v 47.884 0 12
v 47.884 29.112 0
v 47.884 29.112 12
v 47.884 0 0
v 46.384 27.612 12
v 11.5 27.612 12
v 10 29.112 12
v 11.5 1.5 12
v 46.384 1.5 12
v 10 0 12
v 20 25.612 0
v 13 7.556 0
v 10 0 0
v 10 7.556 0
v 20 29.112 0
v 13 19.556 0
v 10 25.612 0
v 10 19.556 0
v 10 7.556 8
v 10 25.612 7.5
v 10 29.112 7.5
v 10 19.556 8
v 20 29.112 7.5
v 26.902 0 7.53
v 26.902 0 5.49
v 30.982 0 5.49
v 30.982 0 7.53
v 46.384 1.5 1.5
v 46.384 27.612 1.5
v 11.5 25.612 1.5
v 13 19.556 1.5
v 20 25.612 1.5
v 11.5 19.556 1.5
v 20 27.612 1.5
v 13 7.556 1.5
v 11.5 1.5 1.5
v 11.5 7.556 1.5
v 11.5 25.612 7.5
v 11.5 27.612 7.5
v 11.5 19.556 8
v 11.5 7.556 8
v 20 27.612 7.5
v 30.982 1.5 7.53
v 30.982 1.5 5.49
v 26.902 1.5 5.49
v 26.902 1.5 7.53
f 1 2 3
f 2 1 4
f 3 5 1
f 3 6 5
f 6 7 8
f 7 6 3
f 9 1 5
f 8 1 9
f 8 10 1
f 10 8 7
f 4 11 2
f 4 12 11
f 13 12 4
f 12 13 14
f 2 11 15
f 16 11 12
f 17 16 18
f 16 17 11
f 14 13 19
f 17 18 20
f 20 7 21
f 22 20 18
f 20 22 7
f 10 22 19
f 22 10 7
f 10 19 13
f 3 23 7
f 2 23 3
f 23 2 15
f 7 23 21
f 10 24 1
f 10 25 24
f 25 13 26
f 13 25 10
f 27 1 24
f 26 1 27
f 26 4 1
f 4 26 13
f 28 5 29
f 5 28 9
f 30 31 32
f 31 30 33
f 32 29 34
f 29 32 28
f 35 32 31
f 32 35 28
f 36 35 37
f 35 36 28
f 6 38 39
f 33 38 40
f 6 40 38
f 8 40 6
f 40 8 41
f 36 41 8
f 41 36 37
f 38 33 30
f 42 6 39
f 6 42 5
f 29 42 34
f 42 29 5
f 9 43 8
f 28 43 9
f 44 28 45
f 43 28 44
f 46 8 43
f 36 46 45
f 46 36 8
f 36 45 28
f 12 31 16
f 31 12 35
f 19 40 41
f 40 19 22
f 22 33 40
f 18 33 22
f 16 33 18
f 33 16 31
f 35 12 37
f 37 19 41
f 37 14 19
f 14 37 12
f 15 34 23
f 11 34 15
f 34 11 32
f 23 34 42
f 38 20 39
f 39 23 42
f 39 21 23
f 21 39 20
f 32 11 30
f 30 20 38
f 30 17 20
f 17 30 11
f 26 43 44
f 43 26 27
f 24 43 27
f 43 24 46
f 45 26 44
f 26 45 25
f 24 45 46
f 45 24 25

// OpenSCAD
length = 34.2 * 1.02;
width = 25.6 * 1.02;

height = 12.0;

thickness = 1.5;
fudge = 0.8;

cylinder_fn = 18;

cable = true;
hole = true;

// case
translate([10, 0, 0])
difference()
{
    //
    translate([0, 0, 0])
        cube([length + 2*thickness, width + 2*thickness, height]);
    translate([thickness, thickness, thickness])
        cube([length, width, height]);
    
    // usb connector
    translate([0, width/2 + thickness - 7, 0])
        cube([3, 12 ,8]);
    
    // reset button
    translate([0, thickness + width - 2, 0])
        cube([10, 2 + thickness, 6 + thickness]);
    
    // cable hole
    if (cable) {
        translate([(length - 4 * 1.02) / 2 + thickness, 0, (height - 1 * 1.02) / 2])
            cube([4 * 1.02, thickness, 2 * 1.02]);
    }
}


// top
//translate([-10 - length - 2*thickness, 0, 0])
//difference()
//{
//    union()
//    {
//        translate([0, 0, 0])
//            cube([length + 2*thickness, width + 2*thickness, thickness]);
//        translate([thickness, thickness, 0])
//            cube([length, width, thickness + fudge]);
//    
//        // hole
//        if (hole) {
//            translate([5, width / 2 + thickness - 4.35, 0])
//                cylinder(h = 3 + thickness + fudge, r = 1.5, $fn = cylinder_fn);
//            translate([5, width / 2 + thickness + 4.35, 0])
//                cylinder(h = 3 + thickness + fudge, r = 1.5, $fn = cylinder_fn);
//        }
//    }
//    
//    if (hole) {
//        translate([10, width / 2 + thickness, 0])
//            cylinder(h = thickness + fudge, r2 = 2.5, r1 = 5, $fn = cylinder_fn);
//    }
//}
